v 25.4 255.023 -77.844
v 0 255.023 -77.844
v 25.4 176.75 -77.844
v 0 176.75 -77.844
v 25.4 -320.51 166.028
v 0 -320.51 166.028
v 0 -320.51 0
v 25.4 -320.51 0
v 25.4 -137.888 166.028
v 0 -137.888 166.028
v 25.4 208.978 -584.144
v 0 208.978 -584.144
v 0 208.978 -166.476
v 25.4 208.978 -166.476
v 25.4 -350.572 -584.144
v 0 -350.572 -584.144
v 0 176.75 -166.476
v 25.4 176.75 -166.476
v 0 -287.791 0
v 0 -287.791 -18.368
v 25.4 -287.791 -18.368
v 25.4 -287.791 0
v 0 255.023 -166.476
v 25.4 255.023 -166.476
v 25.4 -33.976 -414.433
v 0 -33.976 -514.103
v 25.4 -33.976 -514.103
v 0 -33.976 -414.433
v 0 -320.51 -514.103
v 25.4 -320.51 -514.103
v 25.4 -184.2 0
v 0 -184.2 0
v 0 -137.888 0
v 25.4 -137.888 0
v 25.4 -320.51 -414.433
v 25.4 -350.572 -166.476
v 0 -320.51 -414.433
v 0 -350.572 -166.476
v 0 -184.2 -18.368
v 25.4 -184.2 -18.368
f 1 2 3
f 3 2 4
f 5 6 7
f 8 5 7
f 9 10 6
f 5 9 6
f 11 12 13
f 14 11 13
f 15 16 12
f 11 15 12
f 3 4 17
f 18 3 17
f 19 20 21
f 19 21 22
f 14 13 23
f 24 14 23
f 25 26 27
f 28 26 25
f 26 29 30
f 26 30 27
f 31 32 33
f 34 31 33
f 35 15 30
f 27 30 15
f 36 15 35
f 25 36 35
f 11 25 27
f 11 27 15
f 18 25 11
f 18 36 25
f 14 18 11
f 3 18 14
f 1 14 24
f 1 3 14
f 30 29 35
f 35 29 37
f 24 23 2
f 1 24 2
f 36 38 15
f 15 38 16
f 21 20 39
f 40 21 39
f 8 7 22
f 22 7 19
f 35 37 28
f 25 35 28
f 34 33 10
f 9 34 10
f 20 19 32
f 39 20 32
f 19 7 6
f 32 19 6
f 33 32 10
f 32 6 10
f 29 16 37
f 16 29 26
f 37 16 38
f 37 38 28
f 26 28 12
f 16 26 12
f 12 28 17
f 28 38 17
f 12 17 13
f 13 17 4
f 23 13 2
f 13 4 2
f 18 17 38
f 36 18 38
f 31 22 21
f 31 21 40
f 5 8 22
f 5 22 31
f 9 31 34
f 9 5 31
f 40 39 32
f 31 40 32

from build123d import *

# Parameters (mm, degrees)
F0_W     = 103.5911440849
F0_H     = 96.5252518654
F0_H_2   = 18.3683950454
F1_DEPTH = 25.4
F0_W_2   = 286.534268409
F0_H_3   = 99.6700823307


with BuildPart() as f1:
    # F0 (on Right) → F1 (new body)
    with BuildSketch(Plane.YZ):
        Polygon((-287.7907156944, 0), (-287.7907156944, 96.5252518654), (-184.1995716095, 96.5252518654), (-184.1995716095, 166.0278588533), (-320.5098807812, 166.0278588533), (-320.5098807812, 0), align=None)
        with Locations((-235.995143652, 48.2626259327)):
            Rectangle(F0_W, F0_H)
        Polygon((-184.1995716095, 166.0278588533), (-184.1995716095, 96.5252518654), (-184.1995716095, 0), (-137.8883123398, 0), (-137.8883123398, 166.0278588533), align=None)
        with Locations((-235.995143652, -9.1841975227)):
            Rectangle(F0_W, F0_H_2)
    extrude(amount=F1_DEPTH)


with BuildPart() as f1b:
    # F0 (on Right) → F1, piece 2 (new body)
    with BuildSketch(Plane.YZ):
        Polygon((255.0225555897, -166.4763987064), (255.0225555897, -77.8435245156), (176.7499446869, -77.8435245156), (176.7499446869, -166.4763987064), (208.9778631926, -166.4763987064), align=None)
        Polygon((208.9778631926, -166.4763987064), (176.7499446869, -166.4763987064), (-350.5717515945, -166.4763987064), (-350.5717515945, -584.1436982155), (208.9778631926, -584.1436982155), align=None)
        with Locations((-177.2427465767, -464.2681926489)):
            Rectangle(F0_W_2, F0_H_3, mode=Mode.SUBTRACT)
    extrude(amount=F1_DEPTH)


solid = Compound([f1.part, f1b.part])
